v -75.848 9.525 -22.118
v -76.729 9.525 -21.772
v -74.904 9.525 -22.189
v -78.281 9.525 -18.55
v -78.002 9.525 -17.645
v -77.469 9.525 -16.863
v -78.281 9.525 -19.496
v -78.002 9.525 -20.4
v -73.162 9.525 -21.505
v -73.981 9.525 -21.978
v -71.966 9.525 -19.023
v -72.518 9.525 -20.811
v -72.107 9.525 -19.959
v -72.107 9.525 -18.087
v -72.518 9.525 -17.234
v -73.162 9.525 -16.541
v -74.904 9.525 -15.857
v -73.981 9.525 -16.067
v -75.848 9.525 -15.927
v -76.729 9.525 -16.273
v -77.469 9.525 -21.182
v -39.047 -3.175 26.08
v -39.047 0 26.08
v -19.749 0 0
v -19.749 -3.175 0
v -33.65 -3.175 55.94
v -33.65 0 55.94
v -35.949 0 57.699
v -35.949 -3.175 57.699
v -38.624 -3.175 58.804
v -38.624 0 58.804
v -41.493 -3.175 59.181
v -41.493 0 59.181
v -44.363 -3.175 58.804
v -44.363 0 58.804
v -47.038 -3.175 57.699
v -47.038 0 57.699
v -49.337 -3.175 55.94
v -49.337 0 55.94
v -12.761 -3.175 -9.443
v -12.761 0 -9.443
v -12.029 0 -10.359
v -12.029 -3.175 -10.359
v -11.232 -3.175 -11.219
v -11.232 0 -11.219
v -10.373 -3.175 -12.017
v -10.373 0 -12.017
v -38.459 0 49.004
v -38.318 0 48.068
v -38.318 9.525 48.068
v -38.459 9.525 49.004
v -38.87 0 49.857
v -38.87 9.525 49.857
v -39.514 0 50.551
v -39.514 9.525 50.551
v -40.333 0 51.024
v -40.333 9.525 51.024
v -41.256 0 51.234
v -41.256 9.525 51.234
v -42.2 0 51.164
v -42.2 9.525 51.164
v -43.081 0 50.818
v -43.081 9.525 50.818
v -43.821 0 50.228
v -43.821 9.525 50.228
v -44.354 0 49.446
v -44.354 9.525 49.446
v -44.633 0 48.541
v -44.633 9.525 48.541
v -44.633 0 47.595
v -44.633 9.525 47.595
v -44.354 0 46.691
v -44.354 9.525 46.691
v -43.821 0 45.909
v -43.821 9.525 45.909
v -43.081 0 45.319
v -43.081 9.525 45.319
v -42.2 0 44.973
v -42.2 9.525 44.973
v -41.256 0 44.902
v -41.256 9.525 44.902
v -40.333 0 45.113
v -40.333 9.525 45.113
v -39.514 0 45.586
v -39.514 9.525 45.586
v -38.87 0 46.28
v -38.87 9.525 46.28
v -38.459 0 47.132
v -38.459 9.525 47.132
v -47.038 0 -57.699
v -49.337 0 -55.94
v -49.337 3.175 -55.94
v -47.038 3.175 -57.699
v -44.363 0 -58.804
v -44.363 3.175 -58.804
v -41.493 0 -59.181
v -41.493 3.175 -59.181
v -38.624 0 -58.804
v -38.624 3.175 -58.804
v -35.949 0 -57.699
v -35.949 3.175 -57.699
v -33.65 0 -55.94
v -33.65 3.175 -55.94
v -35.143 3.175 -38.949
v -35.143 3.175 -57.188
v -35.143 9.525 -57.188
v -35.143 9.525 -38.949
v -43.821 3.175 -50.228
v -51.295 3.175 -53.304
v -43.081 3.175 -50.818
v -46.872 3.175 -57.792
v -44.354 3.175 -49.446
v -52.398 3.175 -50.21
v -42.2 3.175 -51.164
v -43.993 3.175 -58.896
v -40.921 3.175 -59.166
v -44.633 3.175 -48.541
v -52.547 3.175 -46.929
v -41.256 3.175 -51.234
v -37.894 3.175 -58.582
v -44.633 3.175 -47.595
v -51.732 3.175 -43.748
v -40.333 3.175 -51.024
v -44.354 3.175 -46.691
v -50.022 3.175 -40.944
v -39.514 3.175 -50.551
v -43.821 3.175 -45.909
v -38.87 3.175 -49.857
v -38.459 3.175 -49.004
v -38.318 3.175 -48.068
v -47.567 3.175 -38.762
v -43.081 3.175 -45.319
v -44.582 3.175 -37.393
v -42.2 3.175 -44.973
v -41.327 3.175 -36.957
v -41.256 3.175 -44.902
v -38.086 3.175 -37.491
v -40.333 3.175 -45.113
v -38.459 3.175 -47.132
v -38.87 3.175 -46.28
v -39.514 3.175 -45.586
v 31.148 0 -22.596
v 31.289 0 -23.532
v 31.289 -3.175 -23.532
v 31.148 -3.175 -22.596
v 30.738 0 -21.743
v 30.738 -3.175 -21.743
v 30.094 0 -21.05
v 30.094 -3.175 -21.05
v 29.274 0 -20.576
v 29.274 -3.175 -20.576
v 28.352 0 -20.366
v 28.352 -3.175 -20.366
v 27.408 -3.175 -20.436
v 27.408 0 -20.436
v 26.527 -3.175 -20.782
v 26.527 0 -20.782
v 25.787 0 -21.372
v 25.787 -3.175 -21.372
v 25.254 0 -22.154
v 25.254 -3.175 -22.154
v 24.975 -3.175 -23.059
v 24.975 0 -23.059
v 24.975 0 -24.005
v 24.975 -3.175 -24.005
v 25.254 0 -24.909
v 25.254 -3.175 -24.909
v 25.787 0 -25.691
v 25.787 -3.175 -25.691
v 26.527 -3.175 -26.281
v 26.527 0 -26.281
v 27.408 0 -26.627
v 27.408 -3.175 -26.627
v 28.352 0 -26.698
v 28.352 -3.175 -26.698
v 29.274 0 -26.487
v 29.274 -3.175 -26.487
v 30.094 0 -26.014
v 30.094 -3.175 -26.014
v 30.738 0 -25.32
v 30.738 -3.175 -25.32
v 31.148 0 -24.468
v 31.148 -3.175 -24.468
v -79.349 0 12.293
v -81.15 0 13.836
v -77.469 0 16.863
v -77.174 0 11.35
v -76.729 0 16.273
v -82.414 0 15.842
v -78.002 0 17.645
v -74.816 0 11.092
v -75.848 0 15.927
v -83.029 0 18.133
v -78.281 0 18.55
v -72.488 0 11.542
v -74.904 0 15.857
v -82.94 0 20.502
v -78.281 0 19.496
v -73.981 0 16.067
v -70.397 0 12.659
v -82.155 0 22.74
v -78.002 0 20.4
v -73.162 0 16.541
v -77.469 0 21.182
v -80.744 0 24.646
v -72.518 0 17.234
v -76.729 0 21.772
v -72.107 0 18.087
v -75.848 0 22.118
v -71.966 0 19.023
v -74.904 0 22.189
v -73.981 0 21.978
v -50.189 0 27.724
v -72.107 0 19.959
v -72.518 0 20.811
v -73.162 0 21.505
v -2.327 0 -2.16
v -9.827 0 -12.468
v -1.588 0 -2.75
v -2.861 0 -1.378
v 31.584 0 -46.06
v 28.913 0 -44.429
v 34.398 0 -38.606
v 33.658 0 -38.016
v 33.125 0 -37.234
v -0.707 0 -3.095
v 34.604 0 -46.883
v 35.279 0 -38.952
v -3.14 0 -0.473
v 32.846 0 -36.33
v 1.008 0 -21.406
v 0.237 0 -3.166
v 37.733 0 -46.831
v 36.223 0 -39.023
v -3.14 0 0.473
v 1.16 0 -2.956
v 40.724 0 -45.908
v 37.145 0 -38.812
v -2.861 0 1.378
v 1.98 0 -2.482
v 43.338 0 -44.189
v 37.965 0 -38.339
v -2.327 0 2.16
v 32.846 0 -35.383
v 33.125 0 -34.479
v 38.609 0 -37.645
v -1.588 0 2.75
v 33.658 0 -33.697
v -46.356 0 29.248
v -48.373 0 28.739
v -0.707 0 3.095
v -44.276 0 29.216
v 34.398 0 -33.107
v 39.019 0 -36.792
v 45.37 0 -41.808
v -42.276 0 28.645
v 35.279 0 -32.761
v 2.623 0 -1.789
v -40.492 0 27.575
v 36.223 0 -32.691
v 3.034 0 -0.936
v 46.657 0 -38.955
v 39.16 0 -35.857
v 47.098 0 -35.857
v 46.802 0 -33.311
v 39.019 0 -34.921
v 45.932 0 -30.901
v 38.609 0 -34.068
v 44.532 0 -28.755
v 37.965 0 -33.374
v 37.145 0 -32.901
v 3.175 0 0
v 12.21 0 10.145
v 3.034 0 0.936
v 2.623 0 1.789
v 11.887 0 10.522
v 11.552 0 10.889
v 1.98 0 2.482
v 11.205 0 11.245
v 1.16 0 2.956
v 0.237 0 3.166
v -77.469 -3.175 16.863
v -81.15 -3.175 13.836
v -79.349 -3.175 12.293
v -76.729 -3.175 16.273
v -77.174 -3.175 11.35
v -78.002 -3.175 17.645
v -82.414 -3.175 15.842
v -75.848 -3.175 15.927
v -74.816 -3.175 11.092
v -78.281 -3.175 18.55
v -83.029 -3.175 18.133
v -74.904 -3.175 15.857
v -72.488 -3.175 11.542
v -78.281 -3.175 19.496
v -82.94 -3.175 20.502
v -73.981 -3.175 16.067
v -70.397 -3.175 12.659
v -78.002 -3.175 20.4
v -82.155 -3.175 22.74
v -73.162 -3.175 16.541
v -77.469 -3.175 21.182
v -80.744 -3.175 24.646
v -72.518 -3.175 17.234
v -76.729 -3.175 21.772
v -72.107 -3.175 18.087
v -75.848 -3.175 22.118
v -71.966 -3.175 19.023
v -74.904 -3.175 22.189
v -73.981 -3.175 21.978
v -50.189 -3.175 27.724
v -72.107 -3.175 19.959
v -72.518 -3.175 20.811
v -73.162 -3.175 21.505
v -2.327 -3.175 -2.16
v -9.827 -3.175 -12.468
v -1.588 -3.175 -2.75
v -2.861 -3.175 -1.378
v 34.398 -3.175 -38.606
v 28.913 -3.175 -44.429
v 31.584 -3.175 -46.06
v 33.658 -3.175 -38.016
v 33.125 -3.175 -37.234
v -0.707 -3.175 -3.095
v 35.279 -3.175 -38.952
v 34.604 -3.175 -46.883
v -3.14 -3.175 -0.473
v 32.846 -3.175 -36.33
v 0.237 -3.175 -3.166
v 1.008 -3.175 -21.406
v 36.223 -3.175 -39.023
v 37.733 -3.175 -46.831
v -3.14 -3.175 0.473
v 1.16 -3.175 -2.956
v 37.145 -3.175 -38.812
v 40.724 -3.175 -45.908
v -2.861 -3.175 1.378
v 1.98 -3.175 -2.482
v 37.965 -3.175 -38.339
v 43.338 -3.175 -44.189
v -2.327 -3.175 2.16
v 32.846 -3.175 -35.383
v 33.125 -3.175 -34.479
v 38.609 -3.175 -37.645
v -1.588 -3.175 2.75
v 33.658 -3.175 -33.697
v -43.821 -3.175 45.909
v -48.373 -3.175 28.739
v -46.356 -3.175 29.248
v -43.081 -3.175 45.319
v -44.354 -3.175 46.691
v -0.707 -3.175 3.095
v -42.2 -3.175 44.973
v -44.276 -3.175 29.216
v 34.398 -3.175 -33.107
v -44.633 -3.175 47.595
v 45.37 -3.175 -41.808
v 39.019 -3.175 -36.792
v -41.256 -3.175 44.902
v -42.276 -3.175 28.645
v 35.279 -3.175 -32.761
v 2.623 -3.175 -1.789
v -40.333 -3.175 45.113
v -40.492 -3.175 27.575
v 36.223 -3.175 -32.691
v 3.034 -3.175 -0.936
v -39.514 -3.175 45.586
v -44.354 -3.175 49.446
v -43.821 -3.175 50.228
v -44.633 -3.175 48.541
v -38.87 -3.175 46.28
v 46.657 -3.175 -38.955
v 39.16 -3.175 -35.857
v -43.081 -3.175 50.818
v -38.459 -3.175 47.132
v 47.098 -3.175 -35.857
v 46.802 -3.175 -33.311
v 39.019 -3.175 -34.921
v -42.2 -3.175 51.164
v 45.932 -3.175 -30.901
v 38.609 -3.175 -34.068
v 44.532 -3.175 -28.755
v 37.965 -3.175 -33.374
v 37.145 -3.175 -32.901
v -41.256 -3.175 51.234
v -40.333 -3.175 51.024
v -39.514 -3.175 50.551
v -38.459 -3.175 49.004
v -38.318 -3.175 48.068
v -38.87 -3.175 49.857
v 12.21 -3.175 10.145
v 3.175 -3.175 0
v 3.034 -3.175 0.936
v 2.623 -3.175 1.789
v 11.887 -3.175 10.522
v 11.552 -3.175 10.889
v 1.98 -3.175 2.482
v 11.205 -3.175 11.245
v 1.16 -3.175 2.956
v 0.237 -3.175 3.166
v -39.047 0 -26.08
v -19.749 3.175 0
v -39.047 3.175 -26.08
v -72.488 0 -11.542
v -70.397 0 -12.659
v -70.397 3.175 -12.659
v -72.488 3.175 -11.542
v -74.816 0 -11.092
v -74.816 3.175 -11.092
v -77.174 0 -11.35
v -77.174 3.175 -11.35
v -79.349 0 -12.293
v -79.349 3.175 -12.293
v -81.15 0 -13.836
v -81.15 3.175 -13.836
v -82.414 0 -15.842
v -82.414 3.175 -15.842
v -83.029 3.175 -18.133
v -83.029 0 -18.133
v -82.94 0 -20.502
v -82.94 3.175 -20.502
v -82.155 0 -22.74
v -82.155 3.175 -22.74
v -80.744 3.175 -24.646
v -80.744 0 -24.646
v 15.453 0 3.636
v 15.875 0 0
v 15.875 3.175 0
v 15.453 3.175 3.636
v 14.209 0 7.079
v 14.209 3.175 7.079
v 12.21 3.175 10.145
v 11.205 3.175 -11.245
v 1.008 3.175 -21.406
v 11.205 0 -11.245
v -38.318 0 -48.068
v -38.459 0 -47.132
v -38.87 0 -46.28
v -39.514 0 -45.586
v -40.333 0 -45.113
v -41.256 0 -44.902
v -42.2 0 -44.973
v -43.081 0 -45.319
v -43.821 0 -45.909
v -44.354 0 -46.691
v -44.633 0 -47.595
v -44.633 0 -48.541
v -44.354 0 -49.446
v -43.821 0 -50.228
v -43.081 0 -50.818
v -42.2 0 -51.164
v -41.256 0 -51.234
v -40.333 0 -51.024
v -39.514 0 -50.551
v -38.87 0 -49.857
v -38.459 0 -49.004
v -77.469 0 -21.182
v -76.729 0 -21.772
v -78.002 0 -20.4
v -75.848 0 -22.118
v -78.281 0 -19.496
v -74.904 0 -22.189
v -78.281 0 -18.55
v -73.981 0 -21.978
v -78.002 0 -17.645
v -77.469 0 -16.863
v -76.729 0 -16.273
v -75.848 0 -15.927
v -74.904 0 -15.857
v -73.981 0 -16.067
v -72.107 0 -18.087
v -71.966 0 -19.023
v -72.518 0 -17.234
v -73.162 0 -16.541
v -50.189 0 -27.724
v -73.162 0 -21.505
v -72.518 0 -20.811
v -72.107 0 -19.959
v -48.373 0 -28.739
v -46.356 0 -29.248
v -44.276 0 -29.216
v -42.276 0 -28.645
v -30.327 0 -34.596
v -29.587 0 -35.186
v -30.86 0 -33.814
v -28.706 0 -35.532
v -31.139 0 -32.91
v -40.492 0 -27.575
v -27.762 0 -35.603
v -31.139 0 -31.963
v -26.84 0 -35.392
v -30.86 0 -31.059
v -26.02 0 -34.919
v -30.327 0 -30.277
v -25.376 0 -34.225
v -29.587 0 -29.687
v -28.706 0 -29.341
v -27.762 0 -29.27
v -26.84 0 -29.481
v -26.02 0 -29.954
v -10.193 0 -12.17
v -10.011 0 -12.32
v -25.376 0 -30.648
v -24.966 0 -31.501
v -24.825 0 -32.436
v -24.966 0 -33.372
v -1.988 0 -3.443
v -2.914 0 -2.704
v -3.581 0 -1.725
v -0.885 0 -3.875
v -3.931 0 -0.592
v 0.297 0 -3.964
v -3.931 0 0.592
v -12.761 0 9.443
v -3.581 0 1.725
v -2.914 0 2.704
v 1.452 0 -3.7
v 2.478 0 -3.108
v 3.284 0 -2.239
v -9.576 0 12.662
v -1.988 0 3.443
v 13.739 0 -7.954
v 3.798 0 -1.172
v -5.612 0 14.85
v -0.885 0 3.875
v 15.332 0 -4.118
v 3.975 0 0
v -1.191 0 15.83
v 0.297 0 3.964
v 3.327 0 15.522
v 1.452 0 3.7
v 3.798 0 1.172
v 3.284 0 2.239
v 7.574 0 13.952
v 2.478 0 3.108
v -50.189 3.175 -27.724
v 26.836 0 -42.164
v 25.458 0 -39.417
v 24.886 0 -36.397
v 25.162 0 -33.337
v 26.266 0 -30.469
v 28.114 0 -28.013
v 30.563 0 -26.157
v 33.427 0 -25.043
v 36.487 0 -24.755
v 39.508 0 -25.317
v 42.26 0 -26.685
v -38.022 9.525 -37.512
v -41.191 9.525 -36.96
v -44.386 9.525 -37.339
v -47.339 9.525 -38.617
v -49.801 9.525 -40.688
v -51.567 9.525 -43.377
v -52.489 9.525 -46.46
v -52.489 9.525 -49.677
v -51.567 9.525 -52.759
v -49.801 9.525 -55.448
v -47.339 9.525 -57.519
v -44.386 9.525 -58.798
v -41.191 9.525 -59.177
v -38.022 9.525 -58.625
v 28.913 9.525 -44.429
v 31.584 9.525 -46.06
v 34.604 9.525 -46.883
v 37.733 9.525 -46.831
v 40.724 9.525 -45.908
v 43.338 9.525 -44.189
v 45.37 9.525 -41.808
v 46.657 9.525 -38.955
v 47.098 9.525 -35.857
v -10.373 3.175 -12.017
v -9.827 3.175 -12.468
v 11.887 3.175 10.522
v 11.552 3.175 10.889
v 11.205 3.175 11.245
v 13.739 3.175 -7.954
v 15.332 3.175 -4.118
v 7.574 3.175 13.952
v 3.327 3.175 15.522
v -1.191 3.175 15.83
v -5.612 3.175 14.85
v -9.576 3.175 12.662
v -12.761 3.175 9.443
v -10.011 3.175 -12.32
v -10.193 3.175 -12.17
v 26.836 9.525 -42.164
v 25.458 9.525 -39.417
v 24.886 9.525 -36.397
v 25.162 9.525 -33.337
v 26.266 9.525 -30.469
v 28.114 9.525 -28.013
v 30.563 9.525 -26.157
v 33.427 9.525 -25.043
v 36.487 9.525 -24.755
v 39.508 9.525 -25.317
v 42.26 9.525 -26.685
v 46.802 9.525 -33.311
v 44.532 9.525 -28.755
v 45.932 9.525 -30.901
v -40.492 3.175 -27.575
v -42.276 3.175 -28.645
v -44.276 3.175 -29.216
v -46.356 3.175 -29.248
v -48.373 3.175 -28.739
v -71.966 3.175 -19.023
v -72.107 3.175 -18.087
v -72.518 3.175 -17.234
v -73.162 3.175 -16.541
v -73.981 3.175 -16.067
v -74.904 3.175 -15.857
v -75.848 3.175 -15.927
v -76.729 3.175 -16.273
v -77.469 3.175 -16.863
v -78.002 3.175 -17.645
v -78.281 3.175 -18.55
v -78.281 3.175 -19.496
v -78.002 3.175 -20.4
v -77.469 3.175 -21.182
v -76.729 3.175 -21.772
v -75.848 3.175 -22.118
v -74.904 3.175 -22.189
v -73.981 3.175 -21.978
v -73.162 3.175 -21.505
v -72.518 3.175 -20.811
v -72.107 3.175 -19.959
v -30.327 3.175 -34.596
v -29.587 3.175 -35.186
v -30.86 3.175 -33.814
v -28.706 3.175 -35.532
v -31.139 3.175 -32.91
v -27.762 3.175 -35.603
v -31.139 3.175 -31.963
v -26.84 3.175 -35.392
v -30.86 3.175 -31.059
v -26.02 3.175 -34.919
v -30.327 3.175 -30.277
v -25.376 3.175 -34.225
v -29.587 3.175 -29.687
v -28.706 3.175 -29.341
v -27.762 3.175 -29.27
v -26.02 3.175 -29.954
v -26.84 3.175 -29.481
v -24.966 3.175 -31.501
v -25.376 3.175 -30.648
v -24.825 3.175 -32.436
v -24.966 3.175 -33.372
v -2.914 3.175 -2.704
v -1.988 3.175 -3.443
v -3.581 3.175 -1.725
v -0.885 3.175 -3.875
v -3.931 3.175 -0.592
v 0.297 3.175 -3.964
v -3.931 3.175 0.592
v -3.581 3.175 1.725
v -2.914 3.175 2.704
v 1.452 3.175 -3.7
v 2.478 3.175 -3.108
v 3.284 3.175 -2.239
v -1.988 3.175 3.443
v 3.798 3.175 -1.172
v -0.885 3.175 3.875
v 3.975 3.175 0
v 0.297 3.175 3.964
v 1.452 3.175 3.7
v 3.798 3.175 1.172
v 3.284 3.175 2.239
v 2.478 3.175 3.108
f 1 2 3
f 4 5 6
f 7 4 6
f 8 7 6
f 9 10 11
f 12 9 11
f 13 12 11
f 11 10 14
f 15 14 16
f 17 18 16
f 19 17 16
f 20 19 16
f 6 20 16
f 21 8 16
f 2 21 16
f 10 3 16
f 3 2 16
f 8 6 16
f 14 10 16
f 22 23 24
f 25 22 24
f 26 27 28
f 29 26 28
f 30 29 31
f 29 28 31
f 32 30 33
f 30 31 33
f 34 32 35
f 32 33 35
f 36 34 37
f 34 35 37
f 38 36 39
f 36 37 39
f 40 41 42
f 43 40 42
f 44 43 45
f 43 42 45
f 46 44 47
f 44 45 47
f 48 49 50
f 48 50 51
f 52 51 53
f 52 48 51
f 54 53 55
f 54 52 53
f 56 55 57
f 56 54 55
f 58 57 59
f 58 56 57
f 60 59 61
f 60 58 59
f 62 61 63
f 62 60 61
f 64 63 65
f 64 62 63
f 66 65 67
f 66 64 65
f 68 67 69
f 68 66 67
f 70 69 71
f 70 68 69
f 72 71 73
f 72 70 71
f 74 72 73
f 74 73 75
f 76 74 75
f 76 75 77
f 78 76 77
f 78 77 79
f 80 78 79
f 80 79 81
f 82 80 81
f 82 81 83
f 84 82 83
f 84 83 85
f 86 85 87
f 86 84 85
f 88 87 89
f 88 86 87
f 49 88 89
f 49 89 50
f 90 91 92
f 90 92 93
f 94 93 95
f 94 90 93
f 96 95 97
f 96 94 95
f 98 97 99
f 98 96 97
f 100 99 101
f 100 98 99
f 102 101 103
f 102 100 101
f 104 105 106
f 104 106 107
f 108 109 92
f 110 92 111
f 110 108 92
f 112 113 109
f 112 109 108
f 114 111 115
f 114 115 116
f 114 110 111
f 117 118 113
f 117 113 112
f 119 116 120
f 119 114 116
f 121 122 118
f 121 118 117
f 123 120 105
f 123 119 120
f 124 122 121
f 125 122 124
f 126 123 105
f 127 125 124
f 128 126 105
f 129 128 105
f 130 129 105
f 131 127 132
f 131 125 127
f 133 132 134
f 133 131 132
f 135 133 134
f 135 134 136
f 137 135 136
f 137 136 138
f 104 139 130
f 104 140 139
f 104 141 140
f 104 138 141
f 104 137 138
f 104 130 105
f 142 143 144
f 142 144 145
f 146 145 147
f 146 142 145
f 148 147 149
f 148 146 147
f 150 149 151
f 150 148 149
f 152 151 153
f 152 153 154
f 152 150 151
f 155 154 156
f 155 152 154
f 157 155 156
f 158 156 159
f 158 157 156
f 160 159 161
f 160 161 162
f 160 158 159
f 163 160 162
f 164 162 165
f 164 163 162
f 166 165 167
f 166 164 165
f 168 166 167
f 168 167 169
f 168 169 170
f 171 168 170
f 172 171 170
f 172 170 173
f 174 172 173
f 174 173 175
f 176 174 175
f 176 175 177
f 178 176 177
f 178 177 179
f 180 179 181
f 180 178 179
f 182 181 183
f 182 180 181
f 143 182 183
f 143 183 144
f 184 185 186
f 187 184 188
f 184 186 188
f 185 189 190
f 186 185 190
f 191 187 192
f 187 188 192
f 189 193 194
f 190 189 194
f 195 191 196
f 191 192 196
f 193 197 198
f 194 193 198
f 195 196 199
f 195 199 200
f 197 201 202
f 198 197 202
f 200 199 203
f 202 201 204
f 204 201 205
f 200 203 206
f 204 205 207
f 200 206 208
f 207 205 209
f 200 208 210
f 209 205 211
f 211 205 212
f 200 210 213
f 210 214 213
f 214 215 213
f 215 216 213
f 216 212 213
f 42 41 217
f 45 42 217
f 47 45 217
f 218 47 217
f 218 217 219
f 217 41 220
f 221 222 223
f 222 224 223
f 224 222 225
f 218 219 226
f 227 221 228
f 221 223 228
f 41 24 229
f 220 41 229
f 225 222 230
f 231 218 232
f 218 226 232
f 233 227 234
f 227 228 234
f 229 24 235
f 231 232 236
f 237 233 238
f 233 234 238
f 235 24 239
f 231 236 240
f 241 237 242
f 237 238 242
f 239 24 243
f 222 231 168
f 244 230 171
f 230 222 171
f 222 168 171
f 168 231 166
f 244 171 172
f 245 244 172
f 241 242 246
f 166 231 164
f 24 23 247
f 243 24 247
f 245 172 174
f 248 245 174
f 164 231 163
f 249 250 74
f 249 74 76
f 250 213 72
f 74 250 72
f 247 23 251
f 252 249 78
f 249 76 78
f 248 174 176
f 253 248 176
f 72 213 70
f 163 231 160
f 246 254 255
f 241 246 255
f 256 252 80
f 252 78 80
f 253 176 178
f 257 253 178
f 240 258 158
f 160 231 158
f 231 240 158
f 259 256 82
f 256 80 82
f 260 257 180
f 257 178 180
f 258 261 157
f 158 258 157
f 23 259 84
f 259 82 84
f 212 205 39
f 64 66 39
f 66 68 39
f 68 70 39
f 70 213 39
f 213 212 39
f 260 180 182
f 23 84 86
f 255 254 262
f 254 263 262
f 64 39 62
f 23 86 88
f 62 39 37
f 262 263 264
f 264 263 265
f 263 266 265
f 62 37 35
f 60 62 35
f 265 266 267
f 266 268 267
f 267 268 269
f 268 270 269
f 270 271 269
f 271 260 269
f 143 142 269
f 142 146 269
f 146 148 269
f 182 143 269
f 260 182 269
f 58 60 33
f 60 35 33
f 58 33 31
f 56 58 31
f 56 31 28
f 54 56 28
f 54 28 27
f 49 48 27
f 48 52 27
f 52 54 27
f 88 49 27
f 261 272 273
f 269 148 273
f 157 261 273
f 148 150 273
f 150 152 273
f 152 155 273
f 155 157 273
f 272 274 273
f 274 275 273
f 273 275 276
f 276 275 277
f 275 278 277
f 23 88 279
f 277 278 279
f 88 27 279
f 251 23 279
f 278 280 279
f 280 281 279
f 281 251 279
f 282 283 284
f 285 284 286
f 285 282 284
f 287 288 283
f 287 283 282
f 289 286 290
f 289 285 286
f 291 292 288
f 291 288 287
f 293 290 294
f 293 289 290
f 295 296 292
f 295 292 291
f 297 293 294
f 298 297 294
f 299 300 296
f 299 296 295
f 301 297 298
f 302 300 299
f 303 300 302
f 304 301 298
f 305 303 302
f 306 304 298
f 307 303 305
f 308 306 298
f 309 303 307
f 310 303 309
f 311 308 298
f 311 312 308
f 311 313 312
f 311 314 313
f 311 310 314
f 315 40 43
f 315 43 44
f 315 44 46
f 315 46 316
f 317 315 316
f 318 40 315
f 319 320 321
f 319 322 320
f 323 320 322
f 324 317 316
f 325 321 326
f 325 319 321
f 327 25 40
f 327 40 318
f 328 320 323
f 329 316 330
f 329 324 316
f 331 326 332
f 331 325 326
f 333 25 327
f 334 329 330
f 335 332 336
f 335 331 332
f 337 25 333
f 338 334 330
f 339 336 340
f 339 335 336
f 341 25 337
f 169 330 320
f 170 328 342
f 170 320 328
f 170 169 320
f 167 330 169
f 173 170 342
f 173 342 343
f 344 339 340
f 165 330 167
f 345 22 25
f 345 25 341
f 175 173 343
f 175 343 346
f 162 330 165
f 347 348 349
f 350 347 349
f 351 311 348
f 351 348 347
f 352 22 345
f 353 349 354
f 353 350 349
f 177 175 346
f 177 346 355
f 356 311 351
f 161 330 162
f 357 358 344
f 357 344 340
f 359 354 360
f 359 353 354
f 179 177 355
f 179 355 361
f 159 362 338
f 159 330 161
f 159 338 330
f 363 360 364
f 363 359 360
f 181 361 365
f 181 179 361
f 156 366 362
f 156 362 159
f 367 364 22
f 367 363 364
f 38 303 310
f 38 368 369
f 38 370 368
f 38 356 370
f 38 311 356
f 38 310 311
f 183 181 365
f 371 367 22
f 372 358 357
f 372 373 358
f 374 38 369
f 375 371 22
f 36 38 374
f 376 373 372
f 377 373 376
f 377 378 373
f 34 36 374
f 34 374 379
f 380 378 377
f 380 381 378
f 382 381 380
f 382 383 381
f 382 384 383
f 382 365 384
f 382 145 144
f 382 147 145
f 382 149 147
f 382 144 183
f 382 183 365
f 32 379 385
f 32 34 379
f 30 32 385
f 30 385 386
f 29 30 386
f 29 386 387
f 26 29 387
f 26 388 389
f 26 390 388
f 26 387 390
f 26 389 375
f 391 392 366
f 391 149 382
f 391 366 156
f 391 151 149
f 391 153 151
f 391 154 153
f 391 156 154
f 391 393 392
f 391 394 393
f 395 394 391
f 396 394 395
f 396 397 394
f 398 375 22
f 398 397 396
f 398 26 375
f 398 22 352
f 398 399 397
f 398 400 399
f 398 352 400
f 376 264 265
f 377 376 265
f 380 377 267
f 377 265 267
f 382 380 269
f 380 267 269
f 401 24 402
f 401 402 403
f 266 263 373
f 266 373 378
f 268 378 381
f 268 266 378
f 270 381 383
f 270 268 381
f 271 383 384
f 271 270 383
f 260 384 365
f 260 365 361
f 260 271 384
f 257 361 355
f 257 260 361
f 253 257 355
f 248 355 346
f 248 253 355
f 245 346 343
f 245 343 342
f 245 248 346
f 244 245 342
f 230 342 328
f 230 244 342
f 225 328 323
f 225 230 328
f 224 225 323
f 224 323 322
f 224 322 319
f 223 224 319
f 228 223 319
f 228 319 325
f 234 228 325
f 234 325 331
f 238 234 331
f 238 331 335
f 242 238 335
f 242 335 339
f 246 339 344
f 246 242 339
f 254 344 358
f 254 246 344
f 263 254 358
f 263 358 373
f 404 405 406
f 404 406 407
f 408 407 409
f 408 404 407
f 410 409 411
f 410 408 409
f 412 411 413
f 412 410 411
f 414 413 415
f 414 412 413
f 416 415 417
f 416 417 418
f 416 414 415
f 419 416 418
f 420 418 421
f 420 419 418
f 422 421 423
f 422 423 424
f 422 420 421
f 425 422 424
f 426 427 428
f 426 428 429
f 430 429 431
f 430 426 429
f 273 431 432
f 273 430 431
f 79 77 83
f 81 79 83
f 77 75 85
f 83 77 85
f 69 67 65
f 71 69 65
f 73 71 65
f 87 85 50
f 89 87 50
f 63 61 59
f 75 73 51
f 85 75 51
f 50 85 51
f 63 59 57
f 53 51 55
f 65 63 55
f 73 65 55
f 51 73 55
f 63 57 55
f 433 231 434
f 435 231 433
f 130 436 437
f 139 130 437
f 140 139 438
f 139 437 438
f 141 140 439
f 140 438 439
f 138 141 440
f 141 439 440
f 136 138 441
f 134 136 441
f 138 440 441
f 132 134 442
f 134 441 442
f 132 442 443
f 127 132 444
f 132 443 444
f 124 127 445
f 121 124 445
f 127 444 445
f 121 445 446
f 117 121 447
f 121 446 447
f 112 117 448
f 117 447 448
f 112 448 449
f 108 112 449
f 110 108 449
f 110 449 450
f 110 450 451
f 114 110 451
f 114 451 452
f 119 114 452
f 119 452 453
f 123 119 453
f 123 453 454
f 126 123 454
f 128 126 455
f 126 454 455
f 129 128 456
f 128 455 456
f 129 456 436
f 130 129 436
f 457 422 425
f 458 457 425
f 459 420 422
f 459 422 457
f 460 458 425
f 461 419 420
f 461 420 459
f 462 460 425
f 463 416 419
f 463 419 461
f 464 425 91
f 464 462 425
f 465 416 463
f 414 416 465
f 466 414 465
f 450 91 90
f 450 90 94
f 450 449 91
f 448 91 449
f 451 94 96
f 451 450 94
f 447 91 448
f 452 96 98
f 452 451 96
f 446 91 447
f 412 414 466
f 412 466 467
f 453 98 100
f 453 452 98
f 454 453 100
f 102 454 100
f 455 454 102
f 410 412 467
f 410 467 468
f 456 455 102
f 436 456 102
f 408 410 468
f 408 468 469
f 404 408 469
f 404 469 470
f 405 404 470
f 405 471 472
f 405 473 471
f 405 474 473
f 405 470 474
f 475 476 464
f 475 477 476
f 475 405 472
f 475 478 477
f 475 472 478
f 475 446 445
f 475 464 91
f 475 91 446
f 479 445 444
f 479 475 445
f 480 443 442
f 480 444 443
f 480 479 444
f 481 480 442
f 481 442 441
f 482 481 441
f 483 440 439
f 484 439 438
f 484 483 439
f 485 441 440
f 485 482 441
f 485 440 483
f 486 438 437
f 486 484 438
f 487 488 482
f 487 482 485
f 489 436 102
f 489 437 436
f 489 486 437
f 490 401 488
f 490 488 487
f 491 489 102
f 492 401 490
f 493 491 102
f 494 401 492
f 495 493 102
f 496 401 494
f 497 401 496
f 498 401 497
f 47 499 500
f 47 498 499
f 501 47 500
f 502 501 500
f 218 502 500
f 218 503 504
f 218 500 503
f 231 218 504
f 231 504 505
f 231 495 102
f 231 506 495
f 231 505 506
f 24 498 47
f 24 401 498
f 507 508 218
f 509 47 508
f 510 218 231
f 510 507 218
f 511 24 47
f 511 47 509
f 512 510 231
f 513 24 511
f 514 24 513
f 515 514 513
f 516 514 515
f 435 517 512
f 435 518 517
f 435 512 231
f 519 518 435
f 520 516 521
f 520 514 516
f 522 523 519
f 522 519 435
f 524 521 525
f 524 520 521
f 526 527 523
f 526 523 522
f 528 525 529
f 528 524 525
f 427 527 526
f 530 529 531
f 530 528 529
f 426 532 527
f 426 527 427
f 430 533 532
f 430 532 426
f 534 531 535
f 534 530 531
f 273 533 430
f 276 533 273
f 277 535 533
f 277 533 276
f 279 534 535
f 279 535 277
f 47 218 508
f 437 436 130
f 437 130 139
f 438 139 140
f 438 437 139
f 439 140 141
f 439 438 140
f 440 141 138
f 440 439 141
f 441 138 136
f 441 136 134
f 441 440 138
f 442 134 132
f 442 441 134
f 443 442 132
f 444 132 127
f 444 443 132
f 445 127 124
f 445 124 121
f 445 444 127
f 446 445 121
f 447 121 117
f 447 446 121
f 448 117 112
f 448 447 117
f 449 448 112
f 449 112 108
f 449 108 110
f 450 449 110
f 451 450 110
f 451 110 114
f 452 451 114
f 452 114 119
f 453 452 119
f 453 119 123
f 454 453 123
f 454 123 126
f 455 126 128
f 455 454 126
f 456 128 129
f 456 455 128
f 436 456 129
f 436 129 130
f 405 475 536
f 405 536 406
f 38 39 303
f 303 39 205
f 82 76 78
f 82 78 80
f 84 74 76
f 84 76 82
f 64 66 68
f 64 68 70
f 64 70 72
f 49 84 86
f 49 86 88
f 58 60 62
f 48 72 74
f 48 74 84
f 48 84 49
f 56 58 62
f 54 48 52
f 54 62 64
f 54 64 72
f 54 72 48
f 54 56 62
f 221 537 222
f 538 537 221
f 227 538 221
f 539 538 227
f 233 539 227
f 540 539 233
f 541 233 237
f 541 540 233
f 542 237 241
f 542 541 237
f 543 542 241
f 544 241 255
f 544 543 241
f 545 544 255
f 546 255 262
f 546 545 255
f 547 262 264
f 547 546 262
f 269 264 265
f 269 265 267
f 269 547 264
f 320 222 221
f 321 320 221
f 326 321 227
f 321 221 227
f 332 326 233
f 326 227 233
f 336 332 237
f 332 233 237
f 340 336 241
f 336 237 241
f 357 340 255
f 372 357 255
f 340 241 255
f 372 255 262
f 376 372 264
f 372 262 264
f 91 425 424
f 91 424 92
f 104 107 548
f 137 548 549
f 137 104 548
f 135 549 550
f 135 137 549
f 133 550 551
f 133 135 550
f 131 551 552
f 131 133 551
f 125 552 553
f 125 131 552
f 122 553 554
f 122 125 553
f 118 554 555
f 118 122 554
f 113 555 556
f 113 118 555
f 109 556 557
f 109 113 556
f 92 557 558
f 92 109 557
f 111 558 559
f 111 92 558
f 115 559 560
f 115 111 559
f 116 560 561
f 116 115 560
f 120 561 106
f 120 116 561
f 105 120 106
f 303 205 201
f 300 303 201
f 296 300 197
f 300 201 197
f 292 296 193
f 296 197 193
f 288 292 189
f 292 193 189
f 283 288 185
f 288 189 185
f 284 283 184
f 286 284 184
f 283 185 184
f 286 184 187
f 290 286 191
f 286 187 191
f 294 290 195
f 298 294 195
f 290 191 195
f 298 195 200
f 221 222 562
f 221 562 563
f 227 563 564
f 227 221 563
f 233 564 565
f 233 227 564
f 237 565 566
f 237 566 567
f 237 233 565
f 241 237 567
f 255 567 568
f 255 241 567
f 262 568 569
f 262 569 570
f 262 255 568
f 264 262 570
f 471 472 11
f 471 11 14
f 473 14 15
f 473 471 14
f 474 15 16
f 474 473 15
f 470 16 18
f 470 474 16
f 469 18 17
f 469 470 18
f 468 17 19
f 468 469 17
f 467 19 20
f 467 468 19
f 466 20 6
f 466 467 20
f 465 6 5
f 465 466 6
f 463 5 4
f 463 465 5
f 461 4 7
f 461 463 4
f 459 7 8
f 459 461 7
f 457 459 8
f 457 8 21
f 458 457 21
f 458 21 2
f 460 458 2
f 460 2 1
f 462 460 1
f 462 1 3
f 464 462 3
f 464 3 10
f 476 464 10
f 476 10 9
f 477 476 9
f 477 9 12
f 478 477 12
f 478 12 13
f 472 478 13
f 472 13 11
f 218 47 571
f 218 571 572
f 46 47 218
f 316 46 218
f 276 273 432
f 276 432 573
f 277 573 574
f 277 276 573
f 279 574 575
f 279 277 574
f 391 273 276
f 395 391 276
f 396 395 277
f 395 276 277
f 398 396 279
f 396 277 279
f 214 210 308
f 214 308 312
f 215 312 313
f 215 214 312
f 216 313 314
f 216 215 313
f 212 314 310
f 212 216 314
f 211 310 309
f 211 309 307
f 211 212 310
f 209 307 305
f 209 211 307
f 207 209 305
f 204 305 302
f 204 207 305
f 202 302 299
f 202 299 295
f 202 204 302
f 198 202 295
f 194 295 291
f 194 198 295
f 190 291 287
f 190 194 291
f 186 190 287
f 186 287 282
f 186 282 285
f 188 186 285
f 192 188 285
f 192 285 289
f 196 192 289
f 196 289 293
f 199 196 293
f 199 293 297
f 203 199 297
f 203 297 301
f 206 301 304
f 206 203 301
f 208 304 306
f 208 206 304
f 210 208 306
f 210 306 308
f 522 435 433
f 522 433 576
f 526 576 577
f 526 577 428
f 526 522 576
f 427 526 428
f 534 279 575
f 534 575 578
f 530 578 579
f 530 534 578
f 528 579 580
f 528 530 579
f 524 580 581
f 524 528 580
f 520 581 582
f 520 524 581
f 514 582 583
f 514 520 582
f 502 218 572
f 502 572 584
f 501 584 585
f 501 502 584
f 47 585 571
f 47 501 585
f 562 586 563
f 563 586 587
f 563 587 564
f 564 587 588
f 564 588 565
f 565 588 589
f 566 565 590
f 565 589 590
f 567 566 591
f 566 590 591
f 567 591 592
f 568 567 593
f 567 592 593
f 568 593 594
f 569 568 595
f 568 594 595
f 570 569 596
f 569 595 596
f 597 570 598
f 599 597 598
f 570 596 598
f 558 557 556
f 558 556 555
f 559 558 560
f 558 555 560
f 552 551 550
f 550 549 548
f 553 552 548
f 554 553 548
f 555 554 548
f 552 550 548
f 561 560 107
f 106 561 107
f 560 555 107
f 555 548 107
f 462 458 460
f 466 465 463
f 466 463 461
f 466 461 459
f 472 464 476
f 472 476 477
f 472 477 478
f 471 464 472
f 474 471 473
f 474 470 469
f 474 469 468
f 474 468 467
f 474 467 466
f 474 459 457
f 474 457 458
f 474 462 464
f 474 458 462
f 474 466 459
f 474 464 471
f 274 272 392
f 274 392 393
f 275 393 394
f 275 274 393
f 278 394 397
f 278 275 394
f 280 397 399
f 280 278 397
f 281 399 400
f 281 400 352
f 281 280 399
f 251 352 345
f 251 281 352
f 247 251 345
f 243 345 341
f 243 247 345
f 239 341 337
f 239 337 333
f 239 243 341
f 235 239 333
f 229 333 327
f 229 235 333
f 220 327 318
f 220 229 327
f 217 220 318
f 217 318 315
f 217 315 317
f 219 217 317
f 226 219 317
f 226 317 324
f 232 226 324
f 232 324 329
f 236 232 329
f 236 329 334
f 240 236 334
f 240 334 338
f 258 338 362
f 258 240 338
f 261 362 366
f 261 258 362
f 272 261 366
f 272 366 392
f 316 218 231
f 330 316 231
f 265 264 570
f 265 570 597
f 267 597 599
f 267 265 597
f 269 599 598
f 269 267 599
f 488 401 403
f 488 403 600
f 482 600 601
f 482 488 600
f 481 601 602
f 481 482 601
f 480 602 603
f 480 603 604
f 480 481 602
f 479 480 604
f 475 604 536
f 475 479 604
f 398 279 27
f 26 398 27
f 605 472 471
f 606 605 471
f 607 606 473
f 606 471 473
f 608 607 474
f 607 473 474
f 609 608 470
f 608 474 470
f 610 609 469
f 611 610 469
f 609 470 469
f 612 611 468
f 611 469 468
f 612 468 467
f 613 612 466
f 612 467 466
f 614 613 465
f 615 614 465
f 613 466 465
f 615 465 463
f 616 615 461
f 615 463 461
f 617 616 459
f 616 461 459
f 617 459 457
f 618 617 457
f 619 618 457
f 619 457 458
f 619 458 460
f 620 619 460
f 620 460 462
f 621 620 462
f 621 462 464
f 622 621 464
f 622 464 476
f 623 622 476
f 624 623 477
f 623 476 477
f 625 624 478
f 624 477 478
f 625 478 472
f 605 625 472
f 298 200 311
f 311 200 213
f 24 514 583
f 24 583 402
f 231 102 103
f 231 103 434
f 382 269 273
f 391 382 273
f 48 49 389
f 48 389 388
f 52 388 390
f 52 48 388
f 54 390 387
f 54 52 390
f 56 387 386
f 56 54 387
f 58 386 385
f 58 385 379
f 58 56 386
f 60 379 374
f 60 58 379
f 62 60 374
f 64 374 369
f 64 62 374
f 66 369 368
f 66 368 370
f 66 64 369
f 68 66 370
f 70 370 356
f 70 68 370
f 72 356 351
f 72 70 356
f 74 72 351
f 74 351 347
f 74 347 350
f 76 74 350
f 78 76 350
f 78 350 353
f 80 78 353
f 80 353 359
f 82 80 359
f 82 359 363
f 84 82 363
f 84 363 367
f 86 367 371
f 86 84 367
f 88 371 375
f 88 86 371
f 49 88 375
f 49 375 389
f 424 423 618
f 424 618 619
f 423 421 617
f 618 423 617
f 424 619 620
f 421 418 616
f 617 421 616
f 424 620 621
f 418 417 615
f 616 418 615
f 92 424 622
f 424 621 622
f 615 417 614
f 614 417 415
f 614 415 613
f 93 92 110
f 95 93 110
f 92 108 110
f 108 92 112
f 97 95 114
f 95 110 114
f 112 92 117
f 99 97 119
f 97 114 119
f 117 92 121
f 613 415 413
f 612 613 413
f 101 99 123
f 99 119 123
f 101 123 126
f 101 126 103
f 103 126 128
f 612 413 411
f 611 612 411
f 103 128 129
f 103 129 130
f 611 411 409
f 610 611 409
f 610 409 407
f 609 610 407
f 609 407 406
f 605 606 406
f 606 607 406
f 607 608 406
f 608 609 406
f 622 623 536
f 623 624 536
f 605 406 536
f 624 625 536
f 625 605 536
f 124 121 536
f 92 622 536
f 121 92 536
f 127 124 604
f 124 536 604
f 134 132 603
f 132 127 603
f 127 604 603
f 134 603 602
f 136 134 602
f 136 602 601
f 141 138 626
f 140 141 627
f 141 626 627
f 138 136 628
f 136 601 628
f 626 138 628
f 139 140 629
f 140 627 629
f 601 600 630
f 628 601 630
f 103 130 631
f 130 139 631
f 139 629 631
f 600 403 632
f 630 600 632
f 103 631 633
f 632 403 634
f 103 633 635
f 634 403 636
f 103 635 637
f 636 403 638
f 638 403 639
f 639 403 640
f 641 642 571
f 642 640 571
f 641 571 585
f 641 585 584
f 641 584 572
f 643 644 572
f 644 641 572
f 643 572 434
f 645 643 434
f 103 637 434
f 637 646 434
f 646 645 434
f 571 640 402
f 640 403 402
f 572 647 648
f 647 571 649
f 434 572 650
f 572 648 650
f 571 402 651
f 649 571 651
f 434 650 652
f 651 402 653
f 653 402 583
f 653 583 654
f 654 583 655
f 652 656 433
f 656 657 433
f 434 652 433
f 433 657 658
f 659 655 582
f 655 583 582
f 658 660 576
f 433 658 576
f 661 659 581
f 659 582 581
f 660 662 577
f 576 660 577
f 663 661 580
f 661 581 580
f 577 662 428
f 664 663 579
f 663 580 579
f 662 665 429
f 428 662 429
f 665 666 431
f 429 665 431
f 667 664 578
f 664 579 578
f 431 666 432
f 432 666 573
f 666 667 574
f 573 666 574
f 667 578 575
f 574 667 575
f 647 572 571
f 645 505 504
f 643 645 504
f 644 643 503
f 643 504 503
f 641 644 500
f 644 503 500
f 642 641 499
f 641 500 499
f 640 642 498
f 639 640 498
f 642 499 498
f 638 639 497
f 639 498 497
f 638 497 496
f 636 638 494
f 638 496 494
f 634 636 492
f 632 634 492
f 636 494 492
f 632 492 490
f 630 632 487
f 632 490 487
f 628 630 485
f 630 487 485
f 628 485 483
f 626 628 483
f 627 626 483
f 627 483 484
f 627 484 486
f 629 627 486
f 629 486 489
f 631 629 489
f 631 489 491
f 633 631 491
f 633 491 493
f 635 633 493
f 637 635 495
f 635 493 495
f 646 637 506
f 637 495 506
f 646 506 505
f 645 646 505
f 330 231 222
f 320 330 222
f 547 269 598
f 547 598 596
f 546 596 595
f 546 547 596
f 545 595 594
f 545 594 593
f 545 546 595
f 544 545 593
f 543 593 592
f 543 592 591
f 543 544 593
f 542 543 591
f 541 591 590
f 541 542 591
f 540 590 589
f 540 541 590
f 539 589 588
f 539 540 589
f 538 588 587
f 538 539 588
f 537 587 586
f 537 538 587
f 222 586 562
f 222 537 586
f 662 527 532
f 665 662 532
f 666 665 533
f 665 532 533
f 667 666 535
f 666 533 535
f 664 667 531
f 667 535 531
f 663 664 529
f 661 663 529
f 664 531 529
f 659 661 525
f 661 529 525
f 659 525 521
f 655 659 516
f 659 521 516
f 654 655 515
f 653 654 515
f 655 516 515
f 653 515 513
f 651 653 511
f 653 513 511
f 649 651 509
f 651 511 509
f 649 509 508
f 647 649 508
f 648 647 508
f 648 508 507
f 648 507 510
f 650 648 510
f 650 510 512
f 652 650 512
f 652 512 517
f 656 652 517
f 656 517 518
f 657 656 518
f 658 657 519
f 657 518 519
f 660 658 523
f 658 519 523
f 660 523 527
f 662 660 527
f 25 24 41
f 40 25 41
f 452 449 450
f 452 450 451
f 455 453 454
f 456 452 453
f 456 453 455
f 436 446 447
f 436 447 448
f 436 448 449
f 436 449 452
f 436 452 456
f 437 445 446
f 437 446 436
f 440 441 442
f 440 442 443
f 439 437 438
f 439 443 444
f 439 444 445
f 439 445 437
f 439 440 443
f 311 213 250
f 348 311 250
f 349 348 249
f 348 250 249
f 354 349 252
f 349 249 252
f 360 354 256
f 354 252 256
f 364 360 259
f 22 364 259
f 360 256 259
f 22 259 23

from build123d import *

# Parameters (mm, degrees)
F0_R     = 3.175
F0_R_2   = 3.9751
F1_DEPTH = 3.175
F2_DEPTH = 3.175
F5_DEPTH = 9.525


with BuildPart() as f1:
    # F0 (on Front) → F1 (new body)
    with BuildSketch(Plane.XZ):
        with BuildLine():
            ThreePointArc((-67.2035924475, 19.022847468), (-72.0969787145, 26.3534189212), (-80.7436939481, 24.6455481248))
            ThreePointArc((-80.7436939481, 24.6455481248), (-81.1496169594, 13.8361780704), (-70.3968515915, 12.6591940402))
            ThreePointArc((-70.3968515915, 12.6591940402), (-68.0466820406, 15.4628970151), (-67.2035924475, 19.022847468))
        make_face()
        with Locations((-75.1410924475, 19.022847468)):
            Circle(F0_R, mode=Mode.SUBTRACT)
        with BuildLine():
            ThreePointArc((-12.7612038205, 9.44284396), (-1.190625, 15.8302885984), (11.2052030012, 11.2454013135))
            Line((11.2052030012, 11.2454013135), (-33.6497130803, 55.9399770143))
            ThreePointArc((-33.6497130803, 55.9399770143), (-31.2305551467, 52.3299553211), (-30.3808551811, 48.0681960948))
            ThreePointArc((-30.3808551811, 48.0681960948), (-45.7551144074, 37.8053960604), (-49.336997282, 55.9399770143))
            Line((-49.336997282, 55.9399770143), (-80.7436939481, 24.6455481248))
            ThreePointArc((-80.7436939481, 24.6455481248), (-72.0969787145, 26.3534189212), (-67.2035924475, 19.022847468))
            ThreePointArc((-67.2035924475, 19.022847468), (-68.0466820406, 15.4628970151), (-70.3968515915, 12.6591940402))
            Line((-70.3968515915, 12.6591940402), (-50.1891951564, 27.7244376696))
            ThreePointArc((-50.1891951564, 27.7244376696), (-44.2763495065, 29.2155707059), (-39.0465526417, 26.0795786514))
            Line((-39.0465526417, 26.0795786514), (-19.7485776848, 0))
            Line((-19.7485776848, 0), (-12.7612038205, 9.44284396))
        make_face()
        with BuildLine():
            ThreePointArc((-30.3808551811, 48.0681960948), (-31.2305551467, 52.3299553211), (-33.6497130803, 55.9399770143))
            ThreePointArc((-33.6497130803, 55.9399770143), (-41.4933551811, 59.1806960948), (-49.336997282, 55.9399770143))
            ThreePointArc((-49.336997282, 55.9399770143), (-45.7551144074, 37.8053960604), (-30.3808551811, 48.0681960948))
        make_face()
        with Locations((-41.4933551811, 48.0681960948)):
            Circle(F0_R, mode=Mode.SUBTRACT)
        with BuildLine():
            ThreePointArc((11.2052030012, -11.2454013135), (14.6611429064, -6.088227466), (15.875, 0))
            ThreePointArc((15.875, 0), (14.9306916571, 5.3935212655), (12.2101090846, 10.1453861998))
            ThreePointArc((12.2101090846, 10.1453861998), (11.7205681744, 10.7071894851), (11.2052030012, 11.2454013135))
            ThreePointArc((11.2052030012, 11.2454013135), (-1.190625, 15.8302885984), (-12.7612038205, 9.44284396))
            ThreePointArc((-12.7612038205, 9.44284396), (-15.875, 0), (-12.7612038205, -9.44284396))
            ThreePointArc((-12.7612038205, -9.44284396), (-11.6386596495, -10.7961672163), (-10.3733387953, -12.0170490237))
            Line((-10.3733387953, -12.0170490237), (-9.826735932, -12.4679944628))
            ThreePointArc((-9.826735932, -12.4679944628), (0.9212634625, -15.8482459166), (11.2052030012, -11.2454013135))
        make_face()
        Circle(F0_R_2, mode=Mode.SUBTRACT)
        with BuildLine():
            ThreePointArc((-12.7612038205, -9.44284396), (-15.875, 0), (-12.7612038205, 9.44284396))
            Line((-12.7612038205, 9.44284396), (-19.7485776848, 0))
            Line((-19.7485776848, 0), (-12.7612038205, -9.44284396))
        make_face()
        with BuildLine():
            Line((1.00774715, -21.4064048849), (11.2052030012, -11.2454013135))
            ThreePointArc((11.2052030012, -11.2454013135), (0.9212634625, -15.8482459166), (-9.826735932, -12.4679944628))
            Line((-9.826735932, -12.4679944628), (1.00774715, -21.4064048849))
        make_face()
        with BuildLine():
            ThreePointArc((12.2101090846, 10.1453861998), (14.9306916571, 5.3935212655), (15.875, 0))
            ThreePointArc((15.875, 0), (14.6611429064, -6.088227466), (11.2052030012, -11.2454013135))
            Line((11.2052030012, -11.2454013135), (1.00774715, -21.4064048849))
            Line((1.00774715, -21.4064048849), (28.9134965637, -44.4285499666))
            ThreePointArc((28.9134965637, -44.4285499666), (28.1138099116, -28.0126997872), (44.5323605625, -28.7548792639))
            Line((44.5323605625, -28.7548792639), (12.2101090846, 10.1453861998))
        make_face()
        with Locations((28.1144599424, -23.5318508024)):
            Circle(F0_R, mode=Mode.SUBTRACT)
        with BuildLine():
            ThreePointArc((47.0977842033, -35.8566496037), (46.4367683633, -32.0811847179), (44.5323605625, -28.7548792639))
            ThreePointArc((44.5323605625, -28.7548792639), (28.1138099116, -28.0126997872), (28.9134965637, -44.4285499666))
            ThreePointArc((28.9134965637, -44.4285499666), (40.7235547794, -45.9083384269), (47.0977842033, -35.8566496037))
        make_face()
        with Locations((35.9852842033, -35.8566496037)):
            Circle(F0_R, mode=Mode.SUBTRACT)
        Circle(F0_R_2)
        Circle(F0_R, mode=Mode.SUBTRACT)
    extrude(amount=F1_DEPTH)


with BuildPart() as f2:
    # F0 (on Front) → F2 (new body)
    with BuildSketch(Plane.XZ):
        with BuildLine():
            ThreePointArc((11.2052030012, -11.2454013135), (14.6611429064, -6.088227466), (15.875, 0))
            ThreePointArc((15.875, 0), (14.9306916571, 5.3935212655), (12.2101090846, 10.1453861998))
            ThreePointArc((12.2101090846, 10.1453861998), (11.7205681744, 10.7071894851), (11.2052030012, 11.2454013135))
            ThreePointArc((11.2052030012, 11.2454013135), (-1.190625, 15.8302885984), (-12.7612038205, 9.44284396))
            ThreePointArc((-12.7612038205, 9.44284396), (-15.875, 0), (-12.7612038205, -9.44284396))
            ThreePointArc((-12.7612038205, -9.44284396), (-11.6386596495, -10.7961672163), (-10.3733387953, -12.0170490237))
            Line((-10.3733387953, -12.0170490237), (-9.826735932, -12.4679944628))
            ThreePointArc((-9.826735932, -12.4679944628), (0.9212634625, -15.8482459166), (11.2052030012, -11.2454013135))
        make_face()
        Circle(F0_R_2, mode=Mode.SUBTRACT)
        with BuildLine():
            Line((1.00774715, -21.4064048849), (11.2052030012, -11.2454013135))
            ThreePointArc((11.2052030012, -11.2454013135), (0.9212634625, -15.8482459166), (-9.826735932, -12.4679944628))
            Line((-9.826735932, -12.4679944628), (1.00774715, -21.4064048849))
        make_face()
        with BuildLine():
            ThreePointArc((-12.7612038205, -9.44284396), (-15.875, 0), (-12.7612038205, 9.44284396))
            Line((-12.7612038205, 9.44284396), (-19.7485776848, 0))
            Line((-19.7485776848, 0), (-12.7612038205, -9.44284396))
        make_face()
        with BuildLine():
            Line((1.00774715, -21.4064048849), (-9.826735932, -12.4679944628))
            ThreePointArc((-9.826735932, -12.4679944628), (-10.1025537709, -12.2455719469), (-10.3733387953, -12.0170490237))
            ThreePointArc((-10.3733387953, -12.0170490237), (-11.6386596495, -10.7961672163), (-12.7612038205, -9.44284396))
            Line((-12.7612038205, -9.44284396), (-19.7485776848, 0))
            Line((-19.7485776848, 0), (-39.0465526417, -26.0795786514))
            ThreePointArc((-39.0465526417, -26.0795786514), (-44.2763495065, -29.2155707059), (-50.1891951564, -27.7244376696))
            Line((-50.1891951564, -27.7244376696), (-70.3968515915, -12.6591940402))
            ThreePointArc((-70.3968515915, -12.6591940402), (-68.0466820406, -15.4628970151), (-67.2035924475, -19.022847468))
            ThreePointArc((-67.2035924475, -19.022847468), (-72.0969787145, -26.3534189212), (-80.7436939481, -24.6455481248))
            Line((-80.7436939481, -24.6455481248), (-49.336997282, -55.9399770143))
            ThreePointArc((-49.336997282, -55.9399770143), (-45.7551144074, -37.8053960604), (-30.3808551811, -48.0681960948))
            ThreePointArc((-30.3808551811, -48.0681960948), (-31.2305551467, -52.3299553211), (-33.6497130803, -55.9399770143))
            Line((-33.6497130803, -55.9399770143), (1.00774715, -21.4064048849))
        make_face()
        with Locations((-27.9997160762, -32.4364187248)):
            Circle(F0_R, mode=Mode.SUBTRACT)
        with BuildLine():
            ThreePointArc((-49.336997282, -55.9399770143), (-41.4933551811, -59.1806960948), (-33.6497130803, -55.9399770143))
            ThreePointArc((-33.6497130803, -55.9399770143), (-31.2305551467, -52.3299553211), (-30.3808551811, -48.0681960948))
            ThreePointArc((-30.3808551811, -48.0681960948), (-45.7551144074, -37.8053960604), (-49.336997282, -55.9399770143))
        make_face()
        with Locations((-41.4933551811, -48.0681960948)):
            Circle(F0_R, mode=Mode.SUBTRACT)
        with BuildLine():
            ThreePointArc((-70.3968515915, -12.6591940402), (-81.1496169594, -13.8361780704), (-80.7436939481, -24.6455481248))
            ThreePointArc((-80.7436939481, -24.6455481248), (-72.0969787145, -26.3534189212), (-67.2035924475, -19.022847468))
            ThreePointArc((-67.2035924475, -19.022847468), (-68.0466820406, -15.4628970151), (-70.3968515915, -12.6591940402))
        make_face()
        with Locations((-75.1410924475, -19.022847468)):
            Circle(F0_R, mode=Mode.SUBTRACT)
    extrude(amount=-F2_DEPTH)


with BuildPart() as f5:
    # F3 (on Front) → F5 (new body, through all)
    with BuildSketch(Plane.XZ):
        with BuildLine():
            Line((-35.1433551811, -57.1876892962), (-35.1433551811, -38.9487028935))
            ThreePointArc((-35.1433551811, -38.9487028935), (-52.6058551811, -48.0681960948), (-35.1433551811, -57.1876892962))
        make_face()
    extrude(amount=-F5_DEPTH)

    # F6: cut F1, F2
    add(f1.part, mode=Mode.SUBTRACT)
    add(f2.part, mode=Mode.SUBTRACT)


with BuildPart() as f5b:
    # F0 (on Front) → F5, piece 2 (new body, through all)
    with BuildSketch(Plane.XZ):
        with BuildLine():
            ThreePointArc((47.0977842033, -35.8566496037), (46.4367683633, -32.0811847179), (44.5323605625, -28.7548792639))
            ThreePointArc((44.5323605625, -28.7548792639), (28.1138099116, -28.0126997872), (28.9134965637, -44.4285499666))
            ThreePointArc((28.9134965637, -44.4285499666), (40.7235547794, -45.9083384269), (47.0977842033, -35.8566496037))
        make_face()
        with Locations((35.9852842033, -35.8566496037)):
            Circle(F0_R, mode=Mode.SUBTRACT)
        with Locations((35.9852842033, -35.8566496037)):
            Circle(F0_R)
    extrude(amount=-F5_DEPTH)

    # F6: cut F1, F2
    add(f1.part, mode=Mode.SUBTRACT)
    add(f2.part, mode=Mode.SUBTRACT)


with BuildPart() as f5c:
    # F0 (on Front) → F5, piece 3 (new body, through all)
    with BuildSketch(Plane.XZ):
        with Locations((-75.1410924475, -19.022847468)):
            Circle(F0_R)
    extrude(amount=-F5_DEPTH)

    # F6: cut F1, F2
    add(f1.part, mode=Mode.SUBTRACT)
    add(f2.part, mode=Mode.SUBTRACT)


with BuildPart() as f5d:
    # F0 (on Front) → F5, piece 4 (new body, through all)
    with BuildSketch(Plane.XZ):
        with Locations((-41.4933551811, 48.0681960948)):
            Circle(F0_R)
    extrude(amount=-F5_DEPTH)

    # F6: cut F1, F2
    add(f1.part, mode=Mode.SUBTRACT)
    add(f2.part, mode=Mode.SUBTRACT)


solid = Compound([f1.part, f2.part, f5.part, f5b.part, f5c.part, f5d.part])
